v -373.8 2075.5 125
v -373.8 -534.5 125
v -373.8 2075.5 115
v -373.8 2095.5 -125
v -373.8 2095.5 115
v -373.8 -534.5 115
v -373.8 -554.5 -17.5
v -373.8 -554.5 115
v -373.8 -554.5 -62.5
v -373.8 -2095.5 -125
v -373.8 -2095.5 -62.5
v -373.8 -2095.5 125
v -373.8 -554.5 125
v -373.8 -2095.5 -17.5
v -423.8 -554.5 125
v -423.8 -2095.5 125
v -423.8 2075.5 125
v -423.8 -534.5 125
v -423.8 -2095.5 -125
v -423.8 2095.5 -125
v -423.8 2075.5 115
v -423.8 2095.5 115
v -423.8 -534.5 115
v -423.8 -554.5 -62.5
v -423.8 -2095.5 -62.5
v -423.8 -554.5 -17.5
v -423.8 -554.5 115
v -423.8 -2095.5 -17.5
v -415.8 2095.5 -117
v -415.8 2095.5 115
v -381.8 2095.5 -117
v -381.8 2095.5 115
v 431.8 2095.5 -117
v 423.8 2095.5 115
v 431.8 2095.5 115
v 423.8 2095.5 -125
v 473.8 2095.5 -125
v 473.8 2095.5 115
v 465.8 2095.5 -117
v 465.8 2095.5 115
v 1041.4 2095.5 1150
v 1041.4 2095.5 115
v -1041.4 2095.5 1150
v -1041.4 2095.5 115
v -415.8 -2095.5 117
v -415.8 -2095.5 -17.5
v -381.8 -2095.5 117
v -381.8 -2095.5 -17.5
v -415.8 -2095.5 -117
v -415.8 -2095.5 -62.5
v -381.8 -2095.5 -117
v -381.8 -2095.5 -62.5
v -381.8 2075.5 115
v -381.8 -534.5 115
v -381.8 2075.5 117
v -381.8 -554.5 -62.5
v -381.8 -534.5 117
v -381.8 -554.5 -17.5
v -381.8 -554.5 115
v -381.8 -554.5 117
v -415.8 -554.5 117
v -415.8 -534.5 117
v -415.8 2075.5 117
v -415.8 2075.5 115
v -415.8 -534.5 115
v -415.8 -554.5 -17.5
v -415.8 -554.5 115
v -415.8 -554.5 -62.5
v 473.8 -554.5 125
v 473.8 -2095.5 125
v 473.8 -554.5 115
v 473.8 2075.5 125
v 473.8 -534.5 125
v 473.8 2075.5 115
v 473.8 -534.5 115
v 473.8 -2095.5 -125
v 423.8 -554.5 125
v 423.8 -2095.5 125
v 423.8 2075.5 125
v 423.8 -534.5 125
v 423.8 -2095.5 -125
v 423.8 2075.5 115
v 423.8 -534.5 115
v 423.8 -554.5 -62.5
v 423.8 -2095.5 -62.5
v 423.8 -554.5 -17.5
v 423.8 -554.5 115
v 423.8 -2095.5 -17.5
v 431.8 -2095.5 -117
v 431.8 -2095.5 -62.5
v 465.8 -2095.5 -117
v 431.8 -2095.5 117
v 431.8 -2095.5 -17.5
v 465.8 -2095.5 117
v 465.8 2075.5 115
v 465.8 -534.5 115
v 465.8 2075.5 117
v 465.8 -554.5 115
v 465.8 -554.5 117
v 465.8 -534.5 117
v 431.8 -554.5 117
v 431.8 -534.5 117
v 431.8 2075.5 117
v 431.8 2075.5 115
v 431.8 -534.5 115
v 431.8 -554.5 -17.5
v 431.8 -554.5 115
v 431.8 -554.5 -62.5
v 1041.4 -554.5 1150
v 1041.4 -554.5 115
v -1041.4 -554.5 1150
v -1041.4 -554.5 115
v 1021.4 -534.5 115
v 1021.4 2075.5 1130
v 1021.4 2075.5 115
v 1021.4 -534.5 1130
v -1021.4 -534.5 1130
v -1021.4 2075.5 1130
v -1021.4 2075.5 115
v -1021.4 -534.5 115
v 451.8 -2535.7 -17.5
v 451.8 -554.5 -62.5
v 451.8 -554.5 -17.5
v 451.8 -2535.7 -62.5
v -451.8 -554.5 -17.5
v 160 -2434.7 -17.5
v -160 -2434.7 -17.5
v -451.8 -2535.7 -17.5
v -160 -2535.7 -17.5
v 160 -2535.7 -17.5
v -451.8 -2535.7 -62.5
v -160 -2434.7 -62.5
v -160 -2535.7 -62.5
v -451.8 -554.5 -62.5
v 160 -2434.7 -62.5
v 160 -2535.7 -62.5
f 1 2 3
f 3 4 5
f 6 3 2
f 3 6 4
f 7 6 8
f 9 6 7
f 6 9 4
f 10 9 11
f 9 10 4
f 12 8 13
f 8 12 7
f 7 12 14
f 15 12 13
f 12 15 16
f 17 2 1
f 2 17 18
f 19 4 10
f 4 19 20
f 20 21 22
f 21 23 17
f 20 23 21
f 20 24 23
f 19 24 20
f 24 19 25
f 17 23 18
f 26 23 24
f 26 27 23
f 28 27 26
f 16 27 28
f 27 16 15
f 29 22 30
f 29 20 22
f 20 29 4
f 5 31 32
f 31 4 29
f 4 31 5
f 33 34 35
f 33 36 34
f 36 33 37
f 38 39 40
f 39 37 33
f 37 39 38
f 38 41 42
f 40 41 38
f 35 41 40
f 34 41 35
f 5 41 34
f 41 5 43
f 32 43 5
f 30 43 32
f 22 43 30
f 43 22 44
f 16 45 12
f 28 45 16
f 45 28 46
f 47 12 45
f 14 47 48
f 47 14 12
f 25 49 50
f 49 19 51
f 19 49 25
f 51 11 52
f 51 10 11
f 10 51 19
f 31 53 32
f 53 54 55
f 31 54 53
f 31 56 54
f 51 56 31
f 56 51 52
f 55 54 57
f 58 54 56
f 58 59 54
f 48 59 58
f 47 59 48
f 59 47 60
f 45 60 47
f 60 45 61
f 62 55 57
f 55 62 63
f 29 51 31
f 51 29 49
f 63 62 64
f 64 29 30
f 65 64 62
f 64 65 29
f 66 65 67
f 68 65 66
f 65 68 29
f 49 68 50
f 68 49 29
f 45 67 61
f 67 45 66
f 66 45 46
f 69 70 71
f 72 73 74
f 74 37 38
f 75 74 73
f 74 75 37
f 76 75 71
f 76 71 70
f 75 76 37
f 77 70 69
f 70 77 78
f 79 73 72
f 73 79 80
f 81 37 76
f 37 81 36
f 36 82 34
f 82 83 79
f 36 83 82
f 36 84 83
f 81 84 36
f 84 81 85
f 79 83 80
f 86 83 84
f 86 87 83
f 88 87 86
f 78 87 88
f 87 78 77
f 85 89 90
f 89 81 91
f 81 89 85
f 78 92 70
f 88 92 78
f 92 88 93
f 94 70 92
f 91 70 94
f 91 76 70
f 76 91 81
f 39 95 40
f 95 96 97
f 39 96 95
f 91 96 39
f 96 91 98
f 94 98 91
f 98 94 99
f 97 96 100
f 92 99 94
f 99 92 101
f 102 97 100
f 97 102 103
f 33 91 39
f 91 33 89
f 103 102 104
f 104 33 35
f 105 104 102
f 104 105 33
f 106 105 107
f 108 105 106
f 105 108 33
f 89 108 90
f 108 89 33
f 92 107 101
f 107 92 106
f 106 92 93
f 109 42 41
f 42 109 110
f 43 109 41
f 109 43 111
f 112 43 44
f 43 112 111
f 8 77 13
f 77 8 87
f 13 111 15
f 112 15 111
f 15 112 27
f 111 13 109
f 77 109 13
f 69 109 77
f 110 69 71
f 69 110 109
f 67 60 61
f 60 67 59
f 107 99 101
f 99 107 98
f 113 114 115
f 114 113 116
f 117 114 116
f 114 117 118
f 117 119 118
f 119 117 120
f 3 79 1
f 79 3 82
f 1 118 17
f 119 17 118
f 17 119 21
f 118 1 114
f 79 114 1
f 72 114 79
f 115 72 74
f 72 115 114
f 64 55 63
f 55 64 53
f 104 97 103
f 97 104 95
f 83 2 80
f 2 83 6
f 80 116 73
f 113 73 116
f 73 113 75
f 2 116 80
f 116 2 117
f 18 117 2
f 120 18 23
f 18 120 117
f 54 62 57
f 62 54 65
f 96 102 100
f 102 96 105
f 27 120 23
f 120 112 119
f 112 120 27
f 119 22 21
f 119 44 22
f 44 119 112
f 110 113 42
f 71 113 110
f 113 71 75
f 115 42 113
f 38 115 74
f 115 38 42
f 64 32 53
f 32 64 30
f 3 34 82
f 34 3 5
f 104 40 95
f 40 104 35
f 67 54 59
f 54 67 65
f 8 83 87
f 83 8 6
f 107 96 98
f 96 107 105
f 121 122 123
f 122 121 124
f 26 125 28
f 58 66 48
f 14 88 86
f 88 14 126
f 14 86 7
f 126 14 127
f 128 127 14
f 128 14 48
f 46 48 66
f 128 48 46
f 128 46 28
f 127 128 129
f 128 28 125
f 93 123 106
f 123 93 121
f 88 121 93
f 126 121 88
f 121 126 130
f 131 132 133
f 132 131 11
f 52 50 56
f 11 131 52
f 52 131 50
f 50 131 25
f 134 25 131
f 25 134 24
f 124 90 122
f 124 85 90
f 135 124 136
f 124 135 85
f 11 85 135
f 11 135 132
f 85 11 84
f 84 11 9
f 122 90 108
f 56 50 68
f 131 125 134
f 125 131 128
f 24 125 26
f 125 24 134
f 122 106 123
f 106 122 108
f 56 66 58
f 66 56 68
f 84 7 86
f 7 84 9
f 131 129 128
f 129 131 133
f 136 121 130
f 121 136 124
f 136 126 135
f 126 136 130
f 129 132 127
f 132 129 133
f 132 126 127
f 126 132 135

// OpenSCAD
// ====================================================================================
// REVOLUTIONARY TECHNOLOGY COMPANY & UNIVERSITY OF WASHINGTON DEPARTMENT OF PHYSICS
// Subsystem: silverado_md_extended_structure.scad (Extended Cab / Locked Wheelbase)
// Core Application: Extends Cab Enclosure Back While Keeping Original Wheel Positions
// COMPLIANCE GATE: Maintains absolute 65mm lower open clearance for underbody plates
// Center Origin (0,0,0) = Mid-point of the Original 165-Inch Frame Baseline Rail Axis
// ====================================================================================

$fn = 120; // High-precision CNC profiling and structural weldment resolution

// --- Original 165" Wheelbase Constants (mm) ---
inch_to_mm         = 25.4;
original_wheelbase = 165.0 * inch_to_mm; // Maintained original 4191.00 mm frame length [INDEX]
frame_rail_spacing = 34.0 * inch_to_mm;  // 863.60 mm standard straight truck rail width [INDEX]
rail_height_mm     = 250.00;             // Deep 10-inch heavy commercial profile [INDEX]
rail_thickness_ti  = 8.00;               // Reinforced 8mm structural frame walls [INDEX]

// Structural Extensions & Dimensions (mm)
extended_cab_len   = 2650.00;            // Extended cab back-wall depth (Pushed further back)
short_bed_len      = 78.0 * inch_to_mm;  // Compact 6.5-Foot cargo upfit bed (1981.20 mm depth) [INDEX]
UNDER_ARMOR_CLEARANCE_MM = 65.00;        // Mandatory open installation layer [INDEX]

module original_165_boxed_rails() {
    echo("COMPILING RE-EXTENDED CAB MATRIX WITH LOCKED WHEELBASE HUBS");
    for (side = [-1, 1]) {
        translate([side * (frame_rail_spacing/2 - rail_thickness_ti), -original_wheelbase/2, -rail_height_mm/2]) {
            color("DimGrey") {
                difference() {
                    // Boxed longitudinal Titanium Grade 5 frame rail channel beam [INDEX]
                    cube([50, original_wheelbase, rail_height_mm]);
                    // Hollow interior core step-down saving dead weight
                    translate([rail_thickness_ti, -1, rail_thickness_ti])
                        cube([50 - (2*rail_thickness_ti), original_wheelbase + 2, rail_height_mm - (2*rail_thickness_ti)]);
                }
            }
        }
    }
}

module integrated_extended_armored_cab() {
    // Armored cockpit block extended further back along the frame toward the locked wheels
    translate([0, original_wheelbase/2 - extended_cab_len/2, 600]) {
        color("SlateGrey") {
            difference() {
                cube([82.0 * inch_to_mm, extended_cab_len, 1100], center=true);
                cube([82.0 * inch_to_mm - 40, extended_cab_len - 40, 1060], center=true); // Hollow cockpit [INDEX]
                
                // Lower clearance vector protecting the 65mm skid plate layer [INDEX]
                translate([0, 0, -550])
                    cube([82.0 * inch_to_mm + 10, extended_cab_len + 10, UNDER_ARMOR_CLEARANCE_MM * 2], center=true);
            }
        }
    }
}

module short_bed_placement() {
    // Drops the short bed on the frame right after the extended cab back-wall
    // Maintains the rear wheel center lines matching original dually hubs [INDEX]
    translate([0, original_wheelbase/2 - extended_cab_len - short_bed_len/2, -40]) {
        color("DarkSlateGrey") {
            difference() {
                // Short-bed interface platform grid [INDEX]
                cube([frame_rail_spacing + 40, short_bed_len, 45], center=true);
                // 100mm frame-tail clearance notch to house the 15,000-lb recovery winch [INDEX]
                translate([0, -short_bed_len/2 + 50, 0])
                    cube([320.0, 102.0, 50.0], center=true);
            }
        }
    }
}

// --- Composite Assembly Instantiation ---
union() {
    original_165_boxed_rails();
    integrated_extended_armored_cab();
    short_bed_placement();
}
